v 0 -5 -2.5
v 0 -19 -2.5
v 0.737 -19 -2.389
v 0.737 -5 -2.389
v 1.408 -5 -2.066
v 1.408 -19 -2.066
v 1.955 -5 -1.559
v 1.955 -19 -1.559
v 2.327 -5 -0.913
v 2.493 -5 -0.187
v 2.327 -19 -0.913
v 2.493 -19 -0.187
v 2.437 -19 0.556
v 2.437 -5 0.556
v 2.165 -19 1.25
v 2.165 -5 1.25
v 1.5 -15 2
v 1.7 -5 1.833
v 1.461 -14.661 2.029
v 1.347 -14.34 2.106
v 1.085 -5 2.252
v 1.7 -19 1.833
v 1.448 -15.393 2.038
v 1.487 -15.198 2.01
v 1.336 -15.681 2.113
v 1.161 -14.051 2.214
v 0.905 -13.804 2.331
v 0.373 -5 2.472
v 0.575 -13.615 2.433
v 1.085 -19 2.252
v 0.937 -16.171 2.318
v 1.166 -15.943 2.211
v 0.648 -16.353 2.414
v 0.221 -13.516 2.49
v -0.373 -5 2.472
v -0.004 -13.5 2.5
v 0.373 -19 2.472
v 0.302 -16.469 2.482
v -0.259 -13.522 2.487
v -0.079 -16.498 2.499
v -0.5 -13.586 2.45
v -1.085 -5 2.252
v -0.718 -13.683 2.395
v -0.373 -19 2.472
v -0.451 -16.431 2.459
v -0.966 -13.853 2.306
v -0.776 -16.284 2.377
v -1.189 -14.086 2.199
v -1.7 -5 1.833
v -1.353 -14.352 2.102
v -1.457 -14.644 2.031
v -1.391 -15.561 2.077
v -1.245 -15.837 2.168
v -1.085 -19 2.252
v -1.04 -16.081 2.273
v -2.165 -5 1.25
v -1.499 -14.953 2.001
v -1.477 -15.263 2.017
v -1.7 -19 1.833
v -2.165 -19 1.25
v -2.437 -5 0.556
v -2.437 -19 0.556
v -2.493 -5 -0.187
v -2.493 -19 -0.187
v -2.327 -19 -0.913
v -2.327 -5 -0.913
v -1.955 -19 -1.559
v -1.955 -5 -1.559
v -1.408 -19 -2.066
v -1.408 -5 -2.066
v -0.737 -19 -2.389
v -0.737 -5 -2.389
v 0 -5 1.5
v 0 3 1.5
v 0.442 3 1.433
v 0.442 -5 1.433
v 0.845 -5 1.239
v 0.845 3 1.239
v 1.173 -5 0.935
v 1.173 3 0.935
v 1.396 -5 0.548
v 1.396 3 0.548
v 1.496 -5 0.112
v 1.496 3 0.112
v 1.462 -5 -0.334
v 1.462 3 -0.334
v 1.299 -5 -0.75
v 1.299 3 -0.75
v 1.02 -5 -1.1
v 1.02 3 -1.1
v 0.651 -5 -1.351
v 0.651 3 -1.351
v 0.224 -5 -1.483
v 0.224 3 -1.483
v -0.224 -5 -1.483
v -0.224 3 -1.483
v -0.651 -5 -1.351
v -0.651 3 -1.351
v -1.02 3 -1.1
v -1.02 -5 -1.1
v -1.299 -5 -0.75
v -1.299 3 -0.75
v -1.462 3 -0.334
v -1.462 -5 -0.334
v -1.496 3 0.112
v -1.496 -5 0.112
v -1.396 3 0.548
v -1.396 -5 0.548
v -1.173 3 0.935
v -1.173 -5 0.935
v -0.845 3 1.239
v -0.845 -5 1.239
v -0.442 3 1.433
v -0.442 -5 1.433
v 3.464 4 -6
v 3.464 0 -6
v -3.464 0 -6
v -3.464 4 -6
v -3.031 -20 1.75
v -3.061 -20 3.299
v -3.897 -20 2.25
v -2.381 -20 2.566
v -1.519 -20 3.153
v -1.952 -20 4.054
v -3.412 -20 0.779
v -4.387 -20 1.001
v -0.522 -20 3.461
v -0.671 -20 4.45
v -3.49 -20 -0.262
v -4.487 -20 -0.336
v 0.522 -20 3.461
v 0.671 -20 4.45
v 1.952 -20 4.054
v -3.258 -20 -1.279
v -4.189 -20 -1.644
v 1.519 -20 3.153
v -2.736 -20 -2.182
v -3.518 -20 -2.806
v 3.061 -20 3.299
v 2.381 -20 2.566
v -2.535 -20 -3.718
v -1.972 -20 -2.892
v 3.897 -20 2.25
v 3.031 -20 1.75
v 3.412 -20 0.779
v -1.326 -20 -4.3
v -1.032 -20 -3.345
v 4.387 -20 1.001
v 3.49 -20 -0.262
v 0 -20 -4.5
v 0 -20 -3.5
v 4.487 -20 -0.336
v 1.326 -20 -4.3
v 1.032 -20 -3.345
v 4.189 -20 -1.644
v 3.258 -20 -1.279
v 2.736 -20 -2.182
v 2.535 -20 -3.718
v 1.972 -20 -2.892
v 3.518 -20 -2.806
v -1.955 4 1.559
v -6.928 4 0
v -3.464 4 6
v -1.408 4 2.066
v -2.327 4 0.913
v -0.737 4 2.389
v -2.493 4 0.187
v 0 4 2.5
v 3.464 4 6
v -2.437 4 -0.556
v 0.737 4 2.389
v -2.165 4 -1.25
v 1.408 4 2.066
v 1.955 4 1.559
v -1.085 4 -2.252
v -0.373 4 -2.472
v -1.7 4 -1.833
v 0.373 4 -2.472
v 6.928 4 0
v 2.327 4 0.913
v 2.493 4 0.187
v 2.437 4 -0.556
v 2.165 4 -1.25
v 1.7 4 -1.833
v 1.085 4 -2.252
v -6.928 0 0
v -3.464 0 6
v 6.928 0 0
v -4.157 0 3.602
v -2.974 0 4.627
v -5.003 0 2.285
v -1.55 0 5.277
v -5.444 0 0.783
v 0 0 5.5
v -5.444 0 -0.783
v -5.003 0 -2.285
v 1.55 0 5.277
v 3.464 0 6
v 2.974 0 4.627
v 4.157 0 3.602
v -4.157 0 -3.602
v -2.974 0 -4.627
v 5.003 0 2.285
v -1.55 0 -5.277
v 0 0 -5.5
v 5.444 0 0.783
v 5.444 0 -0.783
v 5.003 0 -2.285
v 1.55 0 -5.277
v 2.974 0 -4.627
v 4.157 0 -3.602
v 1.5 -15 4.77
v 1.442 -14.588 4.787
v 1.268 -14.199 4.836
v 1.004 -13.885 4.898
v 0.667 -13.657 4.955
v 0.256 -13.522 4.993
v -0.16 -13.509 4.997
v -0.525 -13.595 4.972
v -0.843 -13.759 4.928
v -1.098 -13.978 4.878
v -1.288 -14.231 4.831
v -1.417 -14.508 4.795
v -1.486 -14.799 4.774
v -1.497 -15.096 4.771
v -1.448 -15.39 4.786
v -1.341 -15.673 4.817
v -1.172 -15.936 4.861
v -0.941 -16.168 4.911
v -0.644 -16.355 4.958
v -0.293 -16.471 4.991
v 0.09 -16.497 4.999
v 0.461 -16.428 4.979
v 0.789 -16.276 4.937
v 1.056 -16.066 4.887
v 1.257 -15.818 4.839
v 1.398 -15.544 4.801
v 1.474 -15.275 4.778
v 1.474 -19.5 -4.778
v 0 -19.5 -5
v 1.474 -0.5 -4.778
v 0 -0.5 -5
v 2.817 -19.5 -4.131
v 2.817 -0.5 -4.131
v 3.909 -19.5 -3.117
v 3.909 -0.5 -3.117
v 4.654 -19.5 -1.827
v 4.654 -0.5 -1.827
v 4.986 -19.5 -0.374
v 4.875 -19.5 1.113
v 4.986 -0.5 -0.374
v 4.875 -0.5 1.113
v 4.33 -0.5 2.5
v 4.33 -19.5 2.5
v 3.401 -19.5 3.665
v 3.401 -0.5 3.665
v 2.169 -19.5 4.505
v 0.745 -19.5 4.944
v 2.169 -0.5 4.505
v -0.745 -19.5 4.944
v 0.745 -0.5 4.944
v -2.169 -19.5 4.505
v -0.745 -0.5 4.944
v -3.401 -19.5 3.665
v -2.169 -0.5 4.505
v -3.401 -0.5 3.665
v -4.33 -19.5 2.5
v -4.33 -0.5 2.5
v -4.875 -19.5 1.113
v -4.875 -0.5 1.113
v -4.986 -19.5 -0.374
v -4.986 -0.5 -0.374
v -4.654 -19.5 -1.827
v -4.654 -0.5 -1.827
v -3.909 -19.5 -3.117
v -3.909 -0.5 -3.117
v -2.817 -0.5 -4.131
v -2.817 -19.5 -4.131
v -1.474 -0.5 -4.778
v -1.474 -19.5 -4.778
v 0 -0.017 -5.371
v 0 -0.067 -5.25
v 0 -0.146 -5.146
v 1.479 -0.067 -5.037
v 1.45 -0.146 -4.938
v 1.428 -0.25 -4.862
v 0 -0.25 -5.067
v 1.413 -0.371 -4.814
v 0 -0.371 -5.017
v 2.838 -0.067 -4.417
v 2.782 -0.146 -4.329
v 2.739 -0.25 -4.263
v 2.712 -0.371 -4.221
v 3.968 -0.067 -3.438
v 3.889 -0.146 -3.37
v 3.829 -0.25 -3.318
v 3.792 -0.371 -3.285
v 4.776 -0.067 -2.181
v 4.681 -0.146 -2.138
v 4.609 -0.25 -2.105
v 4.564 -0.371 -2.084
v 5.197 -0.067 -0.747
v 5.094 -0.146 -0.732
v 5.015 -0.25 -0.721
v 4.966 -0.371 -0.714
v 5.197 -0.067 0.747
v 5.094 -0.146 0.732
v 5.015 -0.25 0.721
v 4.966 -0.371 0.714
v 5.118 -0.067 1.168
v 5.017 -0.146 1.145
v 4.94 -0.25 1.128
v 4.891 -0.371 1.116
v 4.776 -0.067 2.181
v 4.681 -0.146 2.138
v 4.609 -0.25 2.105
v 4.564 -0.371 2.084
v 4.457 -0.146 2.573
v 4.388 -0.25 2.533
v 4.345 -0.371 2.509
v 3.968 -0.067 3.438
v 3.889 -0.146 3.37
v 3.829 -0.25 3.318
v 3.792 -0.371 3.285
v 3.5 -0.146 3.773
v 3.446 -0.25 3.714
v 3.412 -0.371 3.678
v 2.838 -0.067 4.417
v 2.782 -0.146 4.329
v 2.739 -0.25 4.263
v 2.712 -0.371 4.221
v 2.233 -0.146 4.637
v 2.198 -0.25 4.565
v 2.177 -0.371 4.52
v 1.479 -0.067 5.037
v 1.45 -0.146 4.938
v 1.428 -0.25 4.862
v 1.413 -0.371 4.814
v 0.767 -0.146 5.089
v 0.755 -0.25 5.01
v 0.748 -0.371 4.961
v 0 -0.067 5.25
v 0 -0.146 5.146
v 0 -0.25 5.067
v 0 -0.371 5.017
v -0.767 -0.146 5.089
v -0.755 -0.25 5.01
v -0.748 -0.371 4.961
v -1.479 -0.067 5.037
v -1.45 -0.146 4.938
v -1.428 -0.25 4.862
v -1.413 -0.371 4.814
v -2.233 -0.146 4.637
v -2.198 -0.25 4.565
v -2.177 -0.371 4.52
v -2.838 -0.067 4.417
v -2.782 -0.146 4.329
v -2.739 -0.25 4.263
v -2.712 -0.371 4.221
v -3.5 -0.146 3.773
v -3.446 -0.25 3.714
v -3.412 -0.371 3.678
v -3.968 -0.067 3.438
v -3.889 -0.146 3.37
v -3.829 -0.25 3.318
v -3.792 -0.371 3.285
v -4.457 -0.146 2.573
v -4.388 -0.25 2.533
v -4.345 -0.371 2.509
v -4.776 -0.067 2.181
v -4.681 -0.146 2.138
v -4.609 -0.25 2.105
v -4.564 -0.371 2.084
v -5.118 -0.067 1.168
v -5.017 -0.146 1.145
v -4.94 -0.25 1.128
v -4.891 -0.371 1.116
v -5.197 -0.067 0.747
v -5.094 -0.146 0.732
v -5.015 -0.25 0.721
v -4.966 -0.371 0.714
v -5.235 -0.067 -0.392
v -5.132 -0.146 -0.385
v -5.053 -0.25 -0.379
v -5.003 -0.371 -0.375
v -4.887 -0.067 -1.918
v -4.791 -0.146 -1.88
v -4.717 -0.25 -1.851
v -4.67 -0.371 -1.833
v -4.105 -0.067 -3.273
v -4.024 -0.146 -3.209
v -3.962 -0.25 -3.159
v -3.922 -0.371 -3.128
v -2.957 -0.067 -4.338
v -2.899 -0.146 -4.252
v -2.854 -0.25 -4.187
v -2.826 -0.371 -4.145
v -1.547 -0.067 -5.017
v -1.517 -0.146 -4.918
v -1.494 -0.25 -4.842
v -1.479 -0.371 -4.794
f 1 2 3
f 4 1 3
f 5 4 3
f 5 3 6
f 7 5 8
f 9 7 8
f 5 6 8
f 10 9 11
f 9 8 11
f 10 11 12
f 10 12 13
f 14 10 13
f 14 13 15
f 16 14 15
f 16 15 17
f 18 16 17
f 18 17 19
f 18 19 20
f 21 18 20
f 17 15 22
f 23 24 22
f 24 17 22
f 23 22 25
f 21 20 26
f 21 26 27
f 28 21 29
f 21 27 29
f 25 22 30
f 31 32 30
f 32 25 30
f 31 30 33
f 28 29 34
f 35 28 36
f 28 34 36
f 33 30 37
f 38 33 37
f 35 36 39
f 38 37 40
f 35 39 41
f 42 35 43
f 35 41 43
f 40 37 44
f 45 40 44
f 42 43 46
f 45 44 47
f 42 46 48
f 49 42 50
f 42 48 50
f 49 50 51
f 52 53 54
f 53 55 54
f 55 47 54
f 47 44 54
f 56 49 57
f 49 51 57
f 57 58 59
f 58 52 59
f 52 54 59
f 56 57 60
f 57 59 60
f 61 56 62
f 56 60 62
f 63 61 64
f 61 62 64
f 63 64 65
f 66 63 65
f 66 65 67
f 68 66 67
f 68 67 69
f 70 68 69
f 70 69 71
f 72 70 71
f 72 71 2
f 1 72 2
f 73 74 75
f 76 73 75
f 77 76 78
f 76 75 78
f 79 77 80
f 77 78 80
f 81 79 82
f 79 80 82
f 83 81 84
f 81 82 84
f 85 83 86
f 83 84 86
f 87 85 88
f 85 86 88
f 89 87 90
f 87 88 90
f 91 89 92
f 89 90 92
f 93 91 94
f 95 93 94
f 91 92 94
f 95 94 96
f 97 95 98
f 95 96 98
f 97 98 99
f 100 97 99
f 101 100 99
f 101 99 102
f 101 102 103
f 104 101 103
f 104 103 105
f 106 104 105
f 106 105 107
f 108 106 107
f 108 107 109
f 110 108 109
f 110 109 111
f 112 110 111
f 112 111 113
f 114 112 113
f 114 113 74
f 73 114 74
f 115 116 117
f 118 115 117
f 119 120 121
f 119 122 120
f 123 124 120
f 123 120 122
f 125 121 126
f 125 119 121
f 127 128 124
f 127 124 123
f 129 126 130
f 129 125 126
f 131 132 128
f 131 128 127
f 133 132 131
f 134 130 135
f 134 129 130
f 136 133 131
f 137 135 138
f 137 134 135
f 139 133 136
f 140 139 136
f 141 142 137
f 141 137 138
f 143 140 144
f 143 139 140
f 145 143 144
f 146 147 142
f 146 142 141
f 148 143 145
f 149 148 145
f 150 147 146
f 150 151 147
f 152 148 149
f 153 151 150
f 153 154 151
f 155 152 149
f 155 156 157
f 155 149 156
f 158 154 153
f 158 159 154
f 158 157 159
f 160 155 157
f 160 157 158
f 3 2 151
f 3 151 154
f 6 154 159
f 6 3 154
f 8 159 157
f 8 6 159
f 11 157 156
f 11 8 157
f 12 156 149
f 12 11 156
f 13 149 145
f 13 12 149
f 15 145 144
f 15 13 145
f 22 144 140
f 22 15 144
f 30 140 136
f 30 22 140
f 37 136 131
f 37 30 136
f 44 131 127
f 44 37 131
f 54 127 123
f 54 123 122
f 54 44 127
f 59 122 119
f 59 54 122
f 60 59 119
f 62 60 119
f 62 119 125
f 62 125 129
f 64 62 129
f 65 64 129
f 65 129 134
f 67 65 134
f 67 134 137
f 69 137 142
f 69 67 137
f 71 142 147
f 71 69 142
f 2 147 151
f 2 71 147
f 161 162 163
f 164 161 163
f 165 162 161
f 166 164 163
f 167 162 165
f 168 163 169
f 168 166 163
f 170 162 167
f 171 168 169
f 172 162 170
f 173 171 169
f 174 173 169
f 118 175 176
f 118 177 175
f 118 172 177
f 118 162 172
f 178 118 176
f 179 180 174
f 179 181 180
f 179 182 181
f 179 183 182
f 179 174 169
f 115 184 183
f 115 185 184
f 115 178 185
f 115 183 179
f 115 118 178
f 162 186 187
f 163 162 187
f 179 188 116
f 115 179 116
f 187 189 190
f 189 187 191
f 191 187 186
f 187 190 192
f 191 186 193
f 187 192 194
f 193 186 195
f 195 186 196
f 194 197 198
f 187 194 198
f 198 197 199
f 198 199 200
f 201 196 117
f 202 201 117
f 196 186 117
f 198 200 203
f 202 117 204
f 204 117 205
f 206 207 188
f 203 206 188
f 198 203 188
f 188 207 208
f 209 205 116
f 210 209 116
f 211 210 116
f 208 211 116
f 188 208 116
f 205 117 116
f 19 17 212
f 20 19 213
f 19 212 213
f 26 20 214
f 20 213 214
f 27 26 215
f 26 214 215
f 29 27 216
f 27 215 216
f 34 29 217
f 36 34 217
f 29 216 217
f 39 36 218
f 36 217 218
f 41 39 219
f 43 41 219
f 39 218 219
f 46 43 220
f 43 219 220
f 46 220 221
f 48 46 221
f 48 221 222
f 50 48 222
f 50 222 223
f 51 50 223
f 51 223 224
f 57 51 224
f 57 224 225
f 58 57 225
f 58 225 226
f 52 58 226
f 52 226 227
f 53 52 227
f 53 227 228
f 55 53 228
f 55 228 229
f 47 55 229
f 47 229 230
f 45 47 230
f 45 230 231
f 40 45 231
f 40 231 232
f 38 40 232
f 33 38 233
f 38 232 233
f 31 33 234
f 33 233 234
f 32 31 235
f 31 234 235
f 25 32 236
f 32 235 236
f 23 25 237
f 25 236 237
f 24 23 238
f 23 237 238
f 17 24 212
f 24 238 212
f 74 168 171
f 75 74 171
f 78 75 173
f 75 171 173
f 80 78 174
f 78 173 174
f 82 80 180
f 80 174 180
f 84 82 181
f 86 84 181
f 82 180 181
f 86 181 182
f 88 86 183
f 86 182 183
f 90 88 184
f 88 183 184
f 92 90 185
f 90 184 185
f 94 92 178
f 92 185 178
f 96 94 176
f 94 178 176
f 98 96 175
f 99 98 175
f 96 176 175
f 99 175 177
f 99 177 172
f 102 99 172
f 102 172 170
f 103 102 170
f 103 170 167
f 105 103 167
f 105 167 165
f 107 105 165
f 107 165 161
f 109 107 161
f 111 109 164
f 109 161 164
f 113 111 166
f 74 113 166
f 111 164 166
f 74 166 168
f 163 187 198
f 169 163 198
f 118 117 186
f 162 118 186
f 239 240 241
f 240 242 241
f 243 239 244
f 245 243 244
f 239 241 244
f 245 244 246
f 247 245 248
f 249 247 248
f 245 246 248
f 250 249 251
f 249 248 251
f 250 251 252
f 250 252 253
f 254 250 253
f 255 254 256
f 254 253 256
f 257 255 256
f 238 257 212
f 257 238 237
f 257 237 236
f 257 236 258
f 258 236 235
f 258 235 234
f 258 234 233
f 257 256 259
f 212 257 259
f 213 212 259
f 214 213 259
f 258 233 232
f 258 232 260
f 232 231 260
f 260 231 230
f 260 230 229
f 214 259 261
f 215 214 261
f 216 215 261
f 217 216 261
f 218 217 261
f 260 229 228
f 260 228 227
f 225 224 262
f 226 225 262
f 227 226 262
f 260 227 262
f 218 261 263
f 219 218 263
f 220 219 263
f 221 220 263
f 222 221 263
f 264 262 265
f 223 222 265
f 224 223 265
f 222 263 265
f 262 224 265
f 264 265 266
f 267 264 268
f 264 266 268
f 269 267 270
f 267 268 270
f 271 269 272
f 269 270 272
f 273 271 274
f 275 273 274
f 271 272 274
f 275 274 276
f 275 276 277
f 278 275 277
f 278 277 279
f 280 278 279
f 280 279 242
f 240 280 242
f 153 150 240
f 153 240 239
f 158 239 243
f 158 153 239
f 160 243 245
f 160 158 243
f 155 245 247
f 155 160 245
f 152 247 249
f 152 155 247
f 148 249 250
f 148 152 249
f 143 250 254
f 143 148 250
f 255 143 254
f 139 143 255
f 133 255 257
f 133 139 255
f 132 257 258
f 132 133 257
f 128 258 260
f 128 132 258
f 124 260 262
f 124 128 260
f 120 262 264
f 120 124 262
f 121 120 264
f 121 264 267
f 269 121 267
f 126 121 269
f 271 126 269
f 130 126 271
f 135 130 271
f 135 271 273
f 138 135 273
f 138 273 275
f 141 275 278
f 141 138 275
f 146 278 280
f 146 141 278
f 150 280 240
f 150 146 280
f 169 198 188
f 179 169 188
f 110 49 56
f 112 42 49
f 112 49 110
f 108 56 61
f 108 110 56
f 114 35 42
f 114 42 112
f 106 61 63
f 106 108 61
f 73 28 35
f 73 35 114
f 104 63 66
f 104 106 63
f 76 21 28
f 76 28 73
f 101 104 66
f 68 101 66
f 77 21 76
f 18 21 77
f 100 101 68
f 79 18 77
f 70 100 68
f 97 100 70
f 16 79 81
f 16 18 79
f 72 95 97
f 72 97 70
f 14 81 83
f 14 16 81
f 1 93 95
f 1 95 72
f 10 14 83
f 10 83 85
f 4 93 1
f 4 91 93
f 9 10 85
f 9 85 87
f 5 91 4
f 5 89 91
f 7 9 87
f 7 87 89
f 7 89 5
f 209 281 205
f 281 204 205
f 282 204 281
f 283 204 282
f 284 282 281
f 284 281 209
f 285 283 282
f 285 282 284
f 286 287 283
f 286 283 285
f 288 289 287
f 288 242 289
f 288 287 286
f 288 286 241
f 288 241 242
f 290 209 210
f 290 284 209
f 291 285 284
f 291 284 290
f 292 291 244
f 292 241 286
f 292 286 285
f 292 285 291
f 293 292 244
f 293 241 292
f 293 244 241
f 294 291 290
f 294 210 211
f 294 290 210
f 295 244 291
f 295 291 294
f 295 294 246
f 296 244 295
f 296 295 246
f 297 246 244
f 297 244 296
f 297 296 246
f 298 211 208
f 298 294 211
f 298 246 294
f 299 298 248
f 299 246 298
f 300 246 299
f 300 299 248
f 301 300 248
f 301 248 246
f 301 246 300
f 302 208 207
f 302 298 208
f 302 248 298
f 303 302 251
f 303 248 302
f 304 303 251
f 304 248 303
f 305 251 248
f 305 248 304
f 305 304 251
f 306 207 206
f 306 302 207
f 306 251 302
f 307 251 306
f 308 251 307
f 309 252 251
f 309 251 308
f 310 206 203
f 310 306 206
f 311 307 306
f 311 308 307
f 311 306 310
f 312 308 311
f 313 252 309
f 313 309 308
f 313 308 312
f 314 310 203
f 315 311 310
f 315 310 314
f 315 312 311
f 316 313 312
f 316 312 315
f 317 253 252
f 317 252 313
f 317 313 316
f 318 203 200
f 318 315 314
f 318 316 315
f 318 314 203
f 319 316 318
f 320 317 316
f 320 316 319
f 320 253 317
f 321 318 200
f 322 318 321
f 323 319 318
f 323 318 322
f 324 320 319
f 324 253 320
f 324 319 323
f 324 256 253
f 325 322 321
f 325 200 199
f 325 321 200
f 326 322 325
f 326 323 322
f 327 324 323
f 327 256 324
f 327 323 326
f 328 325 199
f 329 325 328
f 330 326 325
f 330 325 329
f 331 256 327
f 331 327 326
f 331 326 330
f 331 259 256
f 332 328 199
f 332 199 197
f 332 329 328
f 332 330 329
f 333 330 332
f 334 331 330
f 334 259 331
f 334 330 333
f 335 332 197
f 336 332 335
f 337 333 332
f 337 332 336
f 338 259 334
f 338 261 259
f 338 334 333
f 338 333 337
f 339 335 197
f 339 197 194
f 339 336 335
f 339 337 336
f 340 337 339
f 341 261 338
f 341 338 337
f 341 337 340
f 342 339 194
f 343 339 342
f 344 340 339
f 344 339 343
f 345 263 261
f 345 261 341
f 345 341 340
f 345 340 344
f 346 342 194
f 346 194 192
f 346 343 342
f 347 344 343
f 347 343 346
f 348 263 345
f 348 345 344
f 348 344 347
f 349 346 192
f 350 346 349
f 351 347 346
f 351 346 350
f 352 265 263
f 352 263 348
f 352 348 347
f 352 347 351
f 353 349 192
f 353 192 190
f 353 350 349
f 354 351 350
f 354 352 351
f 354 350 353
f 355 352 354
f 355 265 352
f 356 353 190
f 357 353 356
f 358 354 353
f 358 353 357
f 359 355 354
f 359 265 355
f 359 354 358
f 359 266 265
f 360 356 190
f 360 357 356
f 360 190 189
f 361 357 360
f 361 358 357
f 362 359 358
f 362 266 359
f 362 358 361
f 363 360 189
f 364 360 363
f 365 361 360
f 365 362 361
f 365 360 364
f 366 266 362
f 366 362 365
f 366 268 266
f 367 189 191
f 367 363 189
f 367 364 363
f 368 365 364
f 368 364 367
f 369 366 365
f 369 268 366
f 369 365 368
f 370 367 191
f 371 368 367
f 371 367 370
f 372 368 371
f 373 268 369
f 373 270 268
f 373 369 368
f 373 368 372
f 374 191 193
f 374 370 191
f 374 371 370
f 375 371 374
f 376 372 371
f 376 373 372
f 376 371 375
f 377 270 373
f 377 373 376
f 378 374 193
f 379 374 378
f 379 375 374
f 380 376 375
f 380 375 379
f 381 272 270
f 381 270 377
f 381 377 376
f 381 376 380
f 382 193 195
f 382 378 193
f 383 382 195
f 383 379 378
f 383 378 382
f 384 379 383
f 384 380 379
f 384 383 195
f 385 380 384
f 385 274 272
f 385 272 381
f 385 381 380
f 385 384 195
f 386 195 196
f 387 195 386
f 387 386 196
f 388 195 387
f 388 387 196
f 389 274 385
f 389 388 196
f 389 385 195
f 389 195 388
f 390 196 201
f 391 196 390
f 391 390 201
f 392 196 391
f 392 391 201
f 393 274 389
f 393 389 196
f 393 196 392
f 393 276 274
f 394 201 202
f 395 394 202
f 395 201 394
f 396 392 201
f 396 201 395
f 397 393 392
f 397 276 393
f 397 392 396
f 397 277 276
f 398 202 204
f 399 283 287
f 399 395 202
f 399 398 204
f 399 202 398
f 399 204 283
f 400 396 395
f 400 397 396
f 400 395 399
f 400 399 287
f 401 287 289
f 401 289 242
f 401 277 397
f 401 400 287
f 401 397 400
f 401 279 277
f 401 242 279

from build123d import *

# Parameters (mm, degrees)
Y_KSEKLIK_EKSTR_ZYON1_DEPTH = 4
IZIM2_R                     = 5
Y_KSEKLIK_EKSTR_ZYON2_DEPTH = 20
RADYUS3_R                   = 0.5
PAH7_SIZE                   = 0.5
IZIM4_R                     = 2.5
KES_EKSTR_ZYON3_DEPTH       = 15
IZIM3_R                     = 1.5
KES_EKSTR_ZYON4_DEPTH       = 10
IZIM8_R                     = 1.5
KES_EKSTR_ZYON5_DEPTH       = 6
PAH8_SIZE                   = 1
PAH9_SIZE                   = 1


with BuildPart() as part:
    # Çizim1 → Yükseklik-Ekstrüzyon1 (new body)
    with BuildSketch(Plane(origin=(0, 0, 0), x_dir=(1, 0, 0), z_dir=(0, 1, 0))):
        Polygon((6.92820323, 0), (3.464101615, 6), (-3.464101615, 6), (-6.92820323, 0), (-3.464101615, -6), (3.464101615, -6), align=None)
    extrude(amount=Y_KSEKLIK_EKSTR_ZYON1_DEPTH)

    # Çizim2 → Yükseklik-Ekstrüzyon2 (add)
    with BuildSketch(Plane.XZ):
        with Locations(Location((0, 0, 0), (0, 0, 270))):
            Circle(IZIM2_R)
    extrude(amount=Y_KSEKLIK_EKSTR_ZYON2_DEPTH)

    # Radyus3
    radyus3_edges = [part.edges().sort_by_distance(p)[0] for p in [
        (0, 0, 5),
    ]]
    fillet(radyus3_edges, radius=RADYUS3_R)

    # Pah7
    pah7_edges = [part.edges().sort_by_distance(p)[0] for p in [
        (0, -20, 5),
    ]]
    chamfer(pah7_edges, length=PAH7_SIZE)

    # Çizim4 → Kes-Ekstrüzyon3 (cut)
    with BuildSketch(Plane.XZ.offset(20)):
        with Locations(Location((0, 0, 0), (0, 0, 270))):
            Circle(IZIM4_R)
    extrude(amount=-KES_EKSTR_ZYON3_DEPTH, mode=Mode.SUBTRACT)

    # Çizim3 → Kes-Ekstrüzyon4 (cut)
    with BuildSketch(Plane(origin=(0, 4, 0), x_dir=(1, 0, 0), z_dir=(0, 1, 0))):
        with Locations(Location((0, 0, 0), (0, 0, 270))):
            Circle(IZIM3_R)
    extrude(amount=-KES_EKSTR_ZYON4_DEPTH, mode=Mode.SUBTRACT)

    # Çizim8 → Kes-Ekstrüzyon5 (cut)
    with BuildSketch(Plane.XY.offset(6)):
        with Locations((0, -15)):
            Circle(IZIM8_R)
    extrude(amount=-KES_EKSTR_ZYON5_DEPTH, mode=Mode.SUBTRACT)

    # Pah8
    pah8_edges = [part.edges().sort_by_distance(p)[0] for p in [
        (0, -20, 2.5),
    ]]
    chamfer(pah8_edges, length=PAH8_SIZE)

    # Pah9
    pah9_edges = [part.edges().sort_by_distance(p)[0] for p in [
        (0, 4, -1.5),
    ]]
    chamfer(pah9_edges, length=PAH9_SIZE)


solid = part.part
